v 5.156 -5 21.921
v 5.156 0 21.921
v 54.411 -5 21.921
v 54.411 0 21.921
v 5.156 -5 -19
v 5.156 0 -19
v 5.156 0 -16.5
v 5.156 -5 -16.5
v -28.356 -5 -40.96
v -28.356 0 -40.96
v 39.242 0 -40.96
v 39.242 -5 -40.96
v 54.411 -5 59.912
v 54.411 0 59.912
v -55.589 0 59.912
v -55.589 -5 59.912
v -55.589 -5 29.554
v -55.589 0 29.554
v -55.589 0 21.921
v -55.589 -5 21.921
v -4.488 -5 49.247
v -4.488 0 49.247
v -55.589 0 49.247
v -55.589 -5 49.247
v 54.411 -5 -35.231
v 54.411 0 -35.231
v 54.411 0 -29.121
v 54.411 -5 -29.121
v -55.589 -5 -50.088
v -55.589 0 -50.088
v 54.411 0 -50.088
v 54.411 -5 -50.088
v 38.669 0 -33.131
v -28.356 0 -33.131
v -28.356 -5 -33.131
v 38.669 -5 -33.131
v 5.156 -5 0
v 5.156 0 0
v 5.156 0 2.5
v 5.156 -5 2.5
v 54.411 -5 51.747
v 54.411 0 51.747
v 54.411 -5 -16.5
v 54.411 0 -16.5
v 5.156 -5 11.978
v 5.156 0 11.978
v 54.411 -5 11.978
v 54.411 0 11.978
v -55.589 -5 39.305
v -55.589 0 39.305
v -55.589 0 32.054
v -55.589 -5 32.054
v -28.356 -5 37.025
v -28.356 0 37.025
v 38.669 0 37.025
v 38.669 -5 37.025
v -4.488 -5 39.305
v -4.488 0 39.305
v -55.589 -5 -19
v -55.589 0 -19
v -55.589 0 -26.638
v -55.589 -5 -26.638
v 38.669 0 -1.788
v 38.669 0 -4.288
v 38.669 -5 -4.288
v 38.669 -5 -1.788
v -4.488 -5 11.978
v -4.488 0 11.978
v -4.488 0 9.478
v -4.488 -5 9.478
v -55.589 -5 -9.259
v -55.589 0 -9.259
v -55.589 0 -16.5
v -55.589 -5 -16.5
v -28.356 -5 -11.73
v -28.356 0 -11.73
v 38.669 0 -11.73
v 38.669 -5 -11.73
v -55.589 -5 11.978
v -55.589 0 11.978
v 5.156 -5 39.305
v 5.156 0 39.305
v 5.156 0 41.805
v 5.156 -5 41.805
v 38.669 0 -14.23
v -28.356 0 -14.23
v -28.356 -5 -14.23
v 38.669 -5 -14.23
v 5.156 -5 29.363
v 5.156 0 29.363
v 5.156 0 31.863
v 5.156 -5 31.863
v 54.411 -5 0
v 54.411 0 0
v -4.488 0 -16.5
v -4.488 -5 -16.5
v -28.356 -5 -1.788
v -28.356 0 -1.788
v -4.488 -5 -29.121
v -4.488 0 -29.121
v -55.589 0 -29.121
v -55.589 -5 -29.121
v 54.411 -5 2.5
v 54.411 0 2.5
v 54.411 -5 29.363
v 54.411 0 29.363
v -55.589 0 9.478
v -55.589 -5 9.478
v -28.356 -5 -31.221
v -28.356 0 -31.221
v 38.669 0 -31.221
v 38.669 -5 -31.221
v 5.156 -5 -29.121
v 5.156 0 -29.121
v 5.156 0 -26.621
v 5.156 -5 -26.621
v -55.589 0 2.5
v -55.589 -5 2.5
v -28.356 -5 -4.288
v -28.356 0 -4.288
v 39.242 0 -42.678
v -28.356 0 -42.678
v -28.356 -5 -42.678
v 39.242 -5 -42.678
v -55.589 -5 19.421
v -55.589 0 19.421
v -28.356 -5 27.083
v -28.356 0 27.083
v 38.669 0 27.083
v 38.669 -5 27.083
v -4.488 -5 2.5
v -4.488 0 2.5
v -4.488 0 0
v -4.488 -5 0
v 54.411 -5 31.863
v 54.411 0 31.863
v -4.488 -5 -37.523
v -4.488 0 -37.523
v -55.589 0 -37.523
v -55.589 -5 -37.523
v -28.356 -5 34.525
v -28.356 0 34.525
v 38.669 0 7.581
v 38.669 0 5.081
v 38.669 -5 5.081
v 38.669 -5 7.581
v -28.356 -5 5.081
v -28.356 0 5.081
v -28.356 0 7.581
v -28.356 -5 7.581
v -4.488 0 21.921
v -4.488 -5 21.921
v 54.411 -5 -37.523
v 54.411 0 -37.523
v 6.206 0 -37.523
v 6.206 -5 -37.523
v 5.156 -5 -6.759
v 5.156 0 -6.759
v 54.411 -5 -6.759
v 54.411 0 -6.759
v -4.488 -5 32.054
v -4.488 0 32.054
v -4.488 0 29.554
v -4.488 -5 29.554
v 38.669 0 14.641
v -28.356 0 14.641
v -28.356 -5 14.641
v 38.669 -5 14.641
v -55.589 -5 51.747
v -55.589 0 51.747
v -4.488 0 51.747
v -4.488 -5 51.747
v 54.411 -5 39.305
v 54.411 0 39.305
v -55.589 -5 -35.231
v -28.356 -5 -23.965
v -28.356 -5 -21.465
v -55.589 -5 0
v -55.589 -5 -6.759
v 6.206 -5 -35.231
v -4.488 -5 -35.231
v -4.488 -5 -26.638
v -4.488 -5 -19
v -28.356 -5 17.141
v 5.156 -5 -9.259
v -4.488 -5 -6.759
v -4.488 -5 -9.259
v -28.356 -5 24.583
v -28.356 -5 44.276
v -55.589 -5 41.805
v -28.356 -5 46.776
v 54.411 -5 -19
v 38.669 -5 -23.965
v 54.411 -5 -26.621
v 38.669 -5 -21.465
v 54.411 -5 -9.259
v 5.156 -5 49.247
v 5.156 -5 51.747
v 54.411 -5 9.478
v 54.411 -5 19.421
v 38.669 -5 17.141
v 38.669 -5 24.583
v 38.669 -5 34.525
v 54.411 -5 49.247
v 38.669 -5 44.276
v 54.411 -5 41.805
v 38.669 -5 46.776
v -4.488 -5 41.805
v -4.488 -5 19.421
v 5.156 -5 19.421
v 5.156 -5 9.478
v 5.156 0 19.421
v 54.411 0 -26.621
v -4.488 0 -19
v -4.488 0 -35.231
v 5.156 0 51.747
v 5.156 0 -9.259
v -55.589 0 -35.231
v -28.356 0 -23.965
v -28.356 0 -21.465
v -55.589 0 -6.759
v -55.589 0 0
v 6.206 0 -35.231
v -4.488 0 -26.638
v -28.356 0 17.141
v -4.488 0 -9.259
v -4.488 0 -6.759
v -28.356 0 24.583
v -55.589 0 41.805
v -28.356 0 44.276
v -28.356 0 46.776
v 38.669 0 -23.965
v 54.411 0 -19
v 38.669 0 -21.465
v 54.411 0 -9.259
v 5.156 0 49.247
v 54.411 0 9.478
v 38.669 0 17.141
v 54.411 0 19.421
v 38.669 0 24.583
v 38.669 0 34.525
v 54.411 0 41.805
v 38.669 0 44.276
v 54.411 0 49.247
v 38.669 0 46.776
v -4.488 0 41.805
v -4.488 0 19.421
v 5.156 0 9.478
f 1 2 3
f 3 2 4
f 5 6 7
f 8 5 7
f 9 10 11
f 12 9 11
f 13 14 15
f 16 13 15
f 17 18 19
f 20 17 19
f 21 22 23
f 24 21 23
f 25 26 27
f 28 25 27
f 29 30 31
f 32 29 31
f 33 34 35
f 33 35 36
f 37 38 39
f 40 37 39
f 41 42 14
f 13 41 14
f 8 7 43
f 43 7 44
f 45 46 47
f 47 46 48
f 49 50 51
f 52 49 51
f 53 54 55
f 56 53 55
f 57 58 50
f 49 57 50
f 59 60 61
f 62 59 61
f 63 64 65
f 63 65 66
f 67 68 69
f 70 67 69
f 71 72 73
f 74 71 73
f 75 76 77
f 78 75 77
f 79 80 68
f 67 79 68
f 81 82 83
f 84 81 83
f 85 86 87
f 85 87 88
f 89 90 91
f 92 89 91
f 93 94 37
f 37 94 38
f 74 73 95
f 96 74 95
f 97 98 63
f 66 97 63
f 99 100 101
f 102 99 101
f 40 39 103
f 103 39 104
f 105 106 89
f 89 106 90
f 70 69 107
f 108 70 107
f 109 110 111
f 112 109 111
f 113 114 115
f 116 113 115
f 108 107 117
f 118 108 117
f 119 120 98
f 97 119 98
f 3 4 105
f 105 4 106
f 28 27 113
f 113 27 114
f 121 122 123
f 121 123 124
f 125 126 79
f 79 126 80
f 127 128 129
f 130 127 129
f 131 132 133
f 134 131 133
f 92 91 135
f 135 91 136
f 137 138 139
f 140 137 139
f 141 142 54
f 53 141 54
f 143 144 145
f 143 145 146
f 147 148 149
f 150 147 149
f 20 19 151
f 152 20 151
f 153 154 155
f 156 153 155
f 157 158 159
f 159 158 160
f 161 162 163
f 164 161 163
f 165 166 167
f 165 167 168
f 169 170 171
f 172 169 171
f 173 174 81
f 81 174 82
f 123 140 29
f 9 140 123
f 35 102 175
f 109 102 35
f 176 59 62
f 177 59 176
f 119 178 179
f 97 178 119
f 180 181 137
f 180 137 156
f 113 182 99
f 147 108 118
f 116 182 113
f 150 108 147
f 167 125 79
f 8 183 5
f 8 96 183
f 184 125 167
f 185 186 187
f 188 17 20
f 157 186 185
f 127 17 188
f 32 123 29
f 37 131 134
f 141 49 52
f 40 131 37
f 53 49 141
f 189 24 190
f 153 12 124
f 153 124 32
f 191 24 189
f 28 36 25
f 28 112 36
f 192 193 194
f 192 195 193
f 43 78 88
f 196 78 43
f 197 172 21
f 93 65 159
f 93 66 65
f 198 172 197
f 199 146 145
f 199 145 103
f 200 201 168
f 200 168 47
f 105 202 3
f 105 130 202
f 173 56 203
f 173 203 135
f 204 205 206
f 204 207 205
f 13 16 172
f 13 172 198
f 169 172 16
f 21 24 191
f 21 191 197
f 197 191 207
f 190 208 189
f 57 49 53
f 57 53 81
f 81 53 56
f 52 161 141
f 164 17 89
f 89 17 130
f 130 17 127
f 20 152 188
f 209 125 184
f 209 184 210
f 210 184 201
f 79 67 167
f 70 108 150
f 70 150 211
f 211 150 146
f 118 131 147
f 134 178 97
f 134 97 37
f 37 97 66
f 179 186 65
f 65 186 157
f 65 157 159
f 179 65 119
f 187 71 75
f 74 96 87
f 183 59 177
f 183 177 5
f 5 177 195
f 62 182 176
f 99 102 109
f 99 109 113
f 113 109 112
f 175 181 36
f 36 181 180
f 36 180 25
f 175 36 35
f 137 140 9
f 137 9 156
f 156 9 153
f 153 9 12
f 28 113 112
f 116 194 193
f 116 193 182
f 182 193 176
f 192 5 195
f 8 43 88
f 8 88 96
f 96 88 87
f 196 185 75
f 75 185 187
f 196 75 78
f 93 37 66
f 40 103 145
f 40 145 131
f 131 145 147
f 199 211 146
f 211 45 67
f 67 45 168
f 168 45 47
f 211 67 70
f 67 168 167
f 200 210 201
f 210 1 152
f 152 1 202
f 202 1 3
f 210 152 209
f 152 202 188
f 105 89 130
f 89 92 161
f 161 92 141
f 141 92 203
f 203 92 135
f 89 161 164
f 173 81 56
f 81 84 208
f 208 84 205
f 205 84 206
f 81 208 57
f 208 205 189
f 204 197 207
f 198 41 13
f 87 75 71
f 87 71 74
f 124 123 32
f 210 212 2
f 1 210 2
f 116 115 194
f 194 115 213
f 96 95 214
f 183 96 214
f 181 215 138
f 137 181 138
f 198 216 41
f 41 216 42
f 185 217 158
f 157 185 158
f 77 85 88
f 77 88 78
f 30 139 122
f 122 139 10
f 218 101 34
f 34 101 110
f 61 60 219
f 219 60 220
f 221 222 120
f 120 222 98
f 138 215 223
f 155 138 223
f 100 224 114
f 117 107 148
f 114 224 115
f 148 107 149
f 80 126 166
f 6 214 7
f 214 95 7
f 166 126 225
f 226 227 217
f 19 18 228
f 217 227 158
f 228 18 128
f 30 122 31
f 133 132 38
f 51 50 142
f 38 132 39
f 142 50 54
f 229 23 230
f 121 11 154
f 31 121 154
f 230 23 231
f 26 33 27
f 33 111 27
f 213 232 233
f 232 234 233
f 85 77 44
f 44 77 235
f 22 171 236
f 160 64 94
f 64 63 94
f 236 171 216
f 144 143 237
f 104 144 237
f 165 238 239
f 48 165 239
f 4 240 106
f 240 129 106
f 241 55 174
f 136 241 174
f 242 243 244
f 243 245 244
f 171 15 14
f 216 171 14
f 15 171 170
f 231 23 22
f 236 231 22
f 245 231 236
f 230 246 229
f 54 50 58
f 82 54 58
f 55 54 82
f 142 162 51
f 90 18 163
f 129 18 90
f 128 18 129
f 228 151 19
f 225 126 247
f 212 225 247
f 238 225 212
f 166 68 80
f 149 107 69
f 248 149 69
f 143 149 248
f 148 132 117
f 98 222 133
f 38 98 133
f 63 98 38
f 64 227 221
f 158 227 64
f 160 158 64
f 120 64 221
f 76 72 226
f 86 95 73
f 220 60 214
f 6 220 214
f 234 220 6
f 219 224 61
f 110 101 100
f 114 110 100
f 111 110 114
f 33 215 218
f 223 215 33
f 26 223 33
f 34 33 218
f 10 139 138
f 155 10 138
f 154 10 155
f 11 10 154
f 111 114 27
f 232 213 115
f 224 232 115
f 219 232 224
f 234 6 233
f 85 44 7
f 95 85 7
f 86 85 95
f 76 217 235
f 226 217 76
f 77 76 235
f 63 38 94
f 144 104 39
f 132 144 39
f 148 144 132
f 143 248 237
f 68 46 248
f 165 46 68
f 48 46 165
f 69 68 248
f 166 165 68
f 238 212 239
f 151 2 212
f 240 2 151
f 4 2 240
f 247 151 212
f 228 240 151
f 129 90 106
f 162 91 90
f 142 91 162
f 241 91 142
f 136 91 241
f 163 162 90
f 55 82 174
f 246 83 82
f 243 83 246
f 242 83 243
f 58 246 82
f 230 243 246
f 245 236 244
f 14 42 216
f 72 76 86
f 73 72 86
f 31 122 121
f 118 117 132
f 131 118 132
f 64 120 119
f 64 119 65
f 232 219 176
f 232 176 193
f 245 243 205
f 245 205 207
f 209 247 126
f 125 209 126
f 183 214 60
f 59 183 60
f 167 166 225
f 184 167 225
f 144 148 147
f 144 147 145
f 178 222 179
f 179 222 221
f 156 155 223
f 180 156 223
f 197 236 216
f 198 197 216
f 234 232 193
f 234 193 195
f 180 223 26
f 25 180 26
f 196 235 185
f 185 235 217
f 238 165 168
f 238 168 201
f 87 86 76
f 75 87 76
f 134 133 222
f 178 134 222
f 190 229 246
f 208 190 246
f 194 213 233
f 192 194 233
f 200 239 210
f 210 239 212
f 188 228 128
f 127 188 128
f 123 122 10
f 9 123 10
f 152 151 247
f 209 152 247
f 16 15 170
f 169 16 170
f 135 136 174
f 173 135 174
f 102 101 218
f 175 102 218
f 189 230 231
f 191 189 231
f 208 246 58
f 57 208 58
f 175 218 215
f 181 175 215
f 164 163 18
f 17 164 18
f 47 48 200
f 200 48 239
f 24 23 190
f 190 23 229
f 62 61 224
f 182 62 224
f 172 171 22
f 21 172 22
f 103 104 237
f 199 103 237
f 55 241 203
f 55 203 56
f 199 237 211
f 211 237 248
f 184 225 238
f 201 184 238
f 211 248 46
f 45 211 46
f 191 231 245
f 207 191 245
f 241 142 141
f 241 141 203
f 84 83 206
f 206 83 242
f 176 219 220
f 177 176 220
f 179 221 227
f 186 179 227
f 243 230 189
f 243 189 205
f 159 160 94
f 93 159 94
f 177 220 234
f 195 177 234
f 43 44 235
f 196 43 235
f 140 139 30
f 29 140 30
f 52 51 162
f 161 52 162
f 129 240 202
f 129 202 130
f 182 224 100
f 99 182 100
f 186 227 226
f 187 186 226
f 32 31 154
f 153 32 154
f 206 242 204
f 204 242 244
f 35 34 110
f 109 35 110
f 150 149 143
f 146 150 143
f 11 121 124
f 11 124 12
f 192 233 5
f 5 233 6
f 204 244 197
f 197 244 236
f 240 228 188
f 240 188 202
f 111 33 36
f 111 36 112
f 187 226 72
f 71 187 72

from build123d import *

# Parameters (mm, degrees)
F0_W     = 67.597946
F0_H     = 1.718592
F0_W_2   = 67.025
F0_H_2   = 1.909549
F0_H_3   = 2.5
F1_DEPTH = 5


with BuildPart() as f1:
    # F0 (on Front) → F1 (new body)
    with BuildSketch(Plane.XZ):
        Polygon((54.410804, 59.911989), (-55.589196, 59.911989), (-55.589196, 51.747056), (-4.487936, 51.747056), (-4.487936, 49.247056), (-55.589196, 49.247056), (-55.589196, 41.80489), (-4.487936, 41.80489), (-4.487936, 39.30489), (-55.589196, 39.30489), (-55.589196, 32.05392), (-4.487936, 32.05392), (-4.487936, 29.55392), (-55.589196, 29.55392), (-55.589196, 21.920557), (-4.487936, 21.920557), (-4.487936, 19.420557), (-55.589196, 19.420557), (-55.589196, 11.978389), (-4.487936, 11.978389), (-4.487936, 9.478389), (-55.589196, 9.478389), (-55.589196, 2.5), (-4.487936, 2.5), (-4.487936, 0), (-55.589196, 0), (-55.589196, -6.758772), (-4.487936, -6.758772), (-4.487936, -9.258772), (-55.589196, -9.258772), (-55.589196, -16.499988), (-4.487936, -16.499988), (-4.487936, -18.999988), (-55.589196, -18.999988), (-55.589196, -26.638176), (-4.487936, -26.638176), (-4.487936, -29.120585), (-55.589196, -29.120585), (-55.589196, -35.231136), (-4.487936, -35.231136), (-4.487936, -37.522592), (-55.589196, -37.522592), (-55.589196, -50.088011), (54.410804, -50.088011), (54.410804, -37.522592), (6.205984, -37.522592), (6.205984, -35.231136), (54.410804, -35.231136), (54.410804, -29.120585), (5.156064, -29.120585), (5.156064, -26.620585), (54.410804, -26.620585), (54.410804, -18.999988), (5.156064, -18.999988), (5.156064, -16.499988), (54.410804, -16.499988), (54.410804, -9.258772), (5.156064, -9.258772), (5.156064, -6.758772), (54.410804, -6.758772), (54.410804, 0), (5.156064, 0), (5.156064, 2.5), (54.410804, 2.5), (54.410804, 9.478389), (5.156064, 9.478389), (5.156064, 11.978389), (54.410804, 11.978389), (54.410804, 19.420557), (5.156064, 19.420557), (5.156064, 21.920557), (54.410804, 21.920557), (54.410804, 29.362723), (5.156064, 29.362723), (5.156064, 31.862723), (54.410804, 31.862723), (54.410804, 39.30489), (5.156064, 39.30489), (5.156064, 41.80489), (54.410804, 41.80489), (54.410804, 49.247056), (5.156064, 49.247056), (5.156064, 51.747056), (54.410804, 51.747056), align=None)
        with Locations((5.442537, -41.819068)):
            Rectangle(F0_W, F0_H, mode=Mode.SUBTRACT)
        with Locations((5.156064, -32.17586)):
            Rectangle(F0_W_2, F0_H_2, mode=Mode.SUBTRACT)
        with Locations((5.156064, -22.714809)):
            Rectangle(F0_W_2, F0_H_3, mode=Mode.SUBTRACT)
        with Locations((5.156064, -12.979856)):
            Rectangle(F0_W_2, F0_H_3, mode=Mode.SUBTRACT)
        with Locations((5.156064, -3.037689)):
            Rectangle(F0_W_2, F0_H_3, mode=Mode.SUBTRACT)
        with Locations((5.156064, 6.330893)):
            Rectangle(F0_W_2, F0_H_3, mode=Mode.SUBTRACT)
        with Locations((5.156064, 15.890669)):
            Rectangle(F0_W_2, F0_H_3, mode=Mode.SUBTRACT)
        with Locations((5.156064, 25.832837)):
            Rectangle(F0_W_2, F0_H_3, mode=Mode.SUBTRACT)
        with Locations((5.156064, 35.775003)):
            Rectangle(F0_W_2, F0_H_3, mode=Mode.SUBTRACT)
        with Locations((5.156064, 45.525977)):
            Rectangle(F0_W_2, F0_H_3, mode=Mode.SUBTRACT)
    extrude(amount=F1_DEPTH)


solid = f1.part
